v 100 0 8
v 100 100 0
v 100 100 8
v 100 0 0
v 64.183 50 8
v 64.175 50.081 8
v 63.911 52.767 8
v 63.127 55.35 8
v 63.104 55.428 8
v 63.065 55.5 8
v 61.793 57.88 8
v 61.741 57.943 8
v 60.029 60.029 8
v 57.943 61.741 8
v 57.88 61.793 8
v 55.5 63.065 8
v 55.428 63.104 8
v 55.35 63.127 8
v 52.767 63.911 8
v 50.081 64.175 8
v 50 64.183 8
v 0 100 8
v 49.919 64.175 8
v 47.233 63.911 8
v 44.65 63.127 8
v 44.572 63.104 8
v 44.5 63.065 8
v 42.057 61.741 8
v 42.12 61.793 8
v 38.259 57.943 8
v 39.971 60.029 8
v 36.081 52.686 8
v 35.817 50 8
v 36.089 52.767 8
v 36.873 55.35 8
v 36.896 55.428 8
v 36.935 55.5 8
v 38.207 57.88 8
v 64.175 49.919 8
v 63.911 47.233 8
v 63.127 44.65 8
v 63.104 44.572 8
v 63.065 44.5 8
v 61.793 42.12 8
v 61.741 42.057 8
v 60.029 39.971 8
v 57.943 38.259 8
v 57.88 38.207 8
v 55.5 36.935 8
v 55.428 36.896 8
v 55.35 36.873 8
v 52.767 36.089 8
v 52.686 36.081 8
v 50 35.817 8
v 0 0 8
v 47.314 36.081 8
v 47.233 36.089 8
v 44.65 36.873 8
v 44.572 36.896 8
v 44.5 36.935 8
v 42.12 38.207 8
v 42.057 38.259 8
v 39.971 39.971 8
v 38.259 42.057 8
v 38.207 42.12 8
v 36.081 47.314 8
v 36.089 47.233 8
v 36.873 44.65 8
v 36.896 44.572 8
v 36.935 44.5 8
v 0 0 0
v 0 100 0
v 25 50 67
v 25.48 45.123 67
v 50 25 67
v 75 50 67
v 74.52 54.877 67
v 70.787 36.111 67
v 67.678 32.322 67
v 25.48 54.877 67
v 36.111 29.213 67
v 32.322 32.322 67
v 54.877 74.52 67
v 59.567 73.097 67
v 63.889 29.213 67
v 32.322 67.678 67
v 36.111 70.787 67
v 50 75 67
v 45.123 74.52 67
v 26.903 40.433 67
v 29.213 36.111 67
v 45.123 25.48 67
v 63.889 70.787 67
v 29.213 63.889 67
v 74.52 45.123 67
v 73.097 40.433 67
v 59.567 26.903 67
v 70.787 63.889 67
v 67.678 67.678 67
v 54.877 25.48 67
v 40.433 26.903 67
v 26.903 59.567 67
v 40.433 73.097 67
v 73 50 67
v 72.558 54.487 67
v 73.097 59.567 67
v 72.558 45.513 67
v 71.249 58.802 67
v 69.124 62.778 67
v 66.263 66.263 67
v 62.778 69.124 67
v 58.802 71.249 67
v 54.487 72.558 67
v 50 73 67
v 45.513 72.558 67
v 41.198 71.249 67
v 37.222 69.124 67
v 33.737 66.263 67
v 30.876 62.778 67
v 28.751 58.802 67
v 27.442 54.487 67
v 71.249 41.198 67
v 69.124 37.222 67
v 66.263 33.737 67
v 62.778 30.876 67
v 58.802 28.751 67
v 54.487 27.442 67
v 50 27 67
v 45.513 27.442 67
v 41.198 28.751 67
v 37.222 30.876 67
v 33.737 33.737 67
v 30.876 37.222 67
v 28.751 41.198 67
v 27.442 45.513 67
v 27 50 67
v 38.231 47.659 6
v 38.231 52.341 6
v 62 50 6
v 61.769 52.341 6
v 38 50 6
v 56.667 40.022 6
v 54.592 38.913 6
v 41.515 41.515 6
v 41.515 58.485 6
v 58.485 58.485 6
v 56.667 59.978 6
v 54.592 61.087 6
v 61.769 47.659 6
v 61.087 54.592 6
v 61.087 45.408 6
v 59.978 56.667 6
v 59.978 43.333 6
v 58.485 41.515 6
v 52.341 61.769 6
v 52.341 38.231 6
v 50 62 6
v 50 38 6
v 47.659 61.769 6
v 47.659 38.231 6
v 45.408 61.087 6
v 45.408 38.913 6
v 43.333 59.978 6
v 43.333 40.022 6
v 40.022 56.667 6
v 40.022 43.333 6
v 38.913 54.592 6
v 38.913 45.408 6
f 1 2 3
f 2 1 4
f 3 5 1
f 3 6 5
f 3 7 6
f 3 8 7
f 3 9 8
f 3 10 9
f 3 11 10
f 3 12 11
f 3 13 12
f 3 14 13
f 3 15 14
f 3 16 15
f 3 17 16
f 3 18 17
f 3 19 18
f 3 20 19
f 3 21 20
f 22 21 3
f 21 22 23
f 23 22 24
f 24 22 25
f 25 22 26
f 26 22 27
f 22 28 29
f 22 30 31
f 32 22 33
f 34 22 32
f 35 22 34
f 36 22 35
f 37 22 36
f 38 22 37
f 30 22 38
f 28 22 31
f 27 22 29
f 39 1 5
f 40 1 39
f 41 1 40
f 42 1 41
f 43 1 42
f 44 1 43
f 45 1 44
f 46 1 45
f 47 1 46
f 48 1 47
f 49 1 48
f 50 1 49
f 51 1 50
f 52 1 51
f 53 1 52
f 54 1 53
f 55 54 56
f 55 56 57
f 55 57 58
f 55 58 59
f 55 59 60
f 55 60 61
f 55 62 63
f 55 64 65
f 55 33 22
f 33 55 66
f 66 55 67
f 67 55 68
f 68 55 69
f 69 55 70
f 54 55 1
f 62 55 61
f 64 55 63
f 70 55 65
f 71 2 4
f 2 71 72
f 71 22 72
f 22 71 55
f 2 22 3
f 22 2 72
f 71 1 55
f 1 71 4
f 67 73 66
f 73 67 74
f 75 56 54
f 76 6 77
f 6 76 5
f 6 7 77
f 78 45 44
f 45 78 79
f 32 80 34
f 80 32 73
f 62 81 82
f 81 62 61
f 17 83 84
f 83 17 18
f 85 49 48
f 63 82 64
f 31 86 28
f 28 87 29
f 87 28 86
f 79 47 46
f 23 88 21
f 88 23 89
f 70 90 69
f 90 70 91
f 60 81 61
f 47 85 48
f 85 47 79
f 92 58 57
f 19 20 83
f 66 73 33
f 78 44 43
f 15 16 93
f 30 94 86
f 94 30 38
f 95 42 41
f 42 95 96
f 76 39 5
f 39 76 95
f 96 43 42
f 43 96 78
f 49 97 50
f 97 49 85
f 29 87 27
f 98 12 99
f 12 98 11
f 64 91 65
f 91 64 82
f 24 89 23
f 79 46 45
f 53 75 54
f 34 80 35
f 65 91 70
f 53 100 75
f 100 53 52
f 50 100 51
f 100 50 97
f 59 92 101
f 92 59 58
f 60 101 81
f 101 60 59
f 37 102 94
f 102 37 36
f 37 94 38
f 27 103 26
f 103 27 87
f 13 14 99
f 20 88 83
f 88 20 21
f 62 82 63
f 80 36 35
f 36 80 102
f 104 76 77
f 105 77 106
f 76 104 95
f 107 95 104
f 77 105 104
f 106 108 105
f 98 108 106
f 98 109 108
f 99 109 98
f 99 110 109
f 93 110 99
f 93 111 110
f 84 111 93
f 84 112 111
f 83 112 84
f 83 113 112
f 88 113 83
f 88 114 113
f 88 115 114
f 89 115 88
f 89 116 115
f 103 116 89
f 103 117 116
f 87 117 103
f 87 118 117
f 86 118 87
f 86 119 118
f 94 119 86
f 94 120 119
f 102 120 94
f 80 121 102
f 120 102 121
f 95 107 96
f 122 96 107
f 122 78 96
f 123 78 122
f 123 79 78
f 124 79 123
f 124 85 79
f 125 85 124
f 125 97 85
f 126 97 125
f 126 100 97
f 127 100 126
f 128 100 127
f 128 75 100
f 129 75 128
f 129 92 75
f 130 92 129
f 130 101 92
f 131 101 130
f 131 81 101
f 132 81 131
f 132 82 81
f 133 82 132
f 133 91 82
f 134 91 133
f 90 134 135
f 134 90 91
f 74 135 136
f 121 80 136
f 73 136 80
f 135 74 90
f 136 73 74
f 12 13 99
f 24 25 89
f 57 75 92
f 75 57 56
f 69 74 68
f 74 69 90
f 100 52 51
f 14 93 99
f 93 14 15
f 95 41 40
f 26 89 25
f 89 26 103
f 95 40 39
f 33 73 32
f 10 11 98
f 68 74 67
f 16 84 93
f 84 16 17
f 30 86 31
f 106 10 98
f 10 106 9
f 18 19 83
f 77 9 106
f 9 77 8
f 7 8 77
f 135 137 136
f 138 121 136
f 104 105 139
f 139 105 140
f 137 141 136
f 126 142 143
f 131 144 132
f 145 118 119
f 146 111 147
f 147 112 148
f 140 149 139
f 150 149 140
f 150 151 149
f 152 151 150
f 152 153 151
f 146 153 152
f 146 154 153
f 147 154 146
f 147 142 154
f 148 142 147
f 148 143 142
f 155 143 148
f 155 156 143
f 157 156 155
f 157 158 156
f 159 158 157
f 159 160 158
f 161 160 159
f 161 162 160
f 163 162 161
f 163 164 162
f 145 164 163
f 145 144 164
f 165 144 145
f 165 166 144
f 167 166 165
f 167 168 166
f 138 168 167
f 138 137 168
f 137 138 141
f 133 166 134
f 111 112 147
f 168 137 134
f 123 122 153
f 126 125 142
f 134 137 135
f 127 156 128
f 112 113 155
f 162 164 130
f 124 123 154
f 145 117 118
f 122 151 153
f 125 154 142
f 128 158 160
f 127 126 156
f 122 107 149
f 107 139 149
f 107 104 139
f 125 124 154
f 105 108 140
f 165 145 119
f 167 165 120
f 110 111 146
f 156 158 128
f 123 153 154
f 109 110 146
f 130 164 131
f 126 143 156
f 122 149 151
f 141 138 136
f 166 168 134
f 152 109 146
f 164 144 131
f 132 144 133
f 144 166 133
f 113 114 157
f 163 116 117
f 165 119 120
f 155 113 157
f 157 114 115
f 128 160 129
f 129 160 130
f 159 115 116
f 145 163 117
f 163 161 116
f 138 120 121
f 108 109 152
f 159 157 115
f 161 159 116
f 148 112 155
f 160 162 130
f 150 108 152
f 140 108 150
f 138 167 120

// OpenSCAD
$fn = 32;

// ----------------------------------------------------------------------
// Hopper: funnel with square flange
// ----------------------------------------------------------------------

// --- parameters (mm) ---
fl = 100;                 // flange side, X and Y
fl_t = 8;                 // flange thickness
cone_h = 60;              // cone height above the flange
top_d = 50;               // cone mouth diameter
bot_d = 28;               // cone spout diameter
wall = 2;                 // cone wall thickness

bore_d = bot_d - 2 * wall;  // spout bore diameter
total_h = fl_t + cone_h - 1;  // overall height

difference() {
  union() {
    cube([fl, fl, fl_t]);
    translate([fl / 2, fl / 2, fl_t - 1])
      cylinder(h = cone_h, d1 = bot_d, d2 = top_d);
  }
  translate([fl / 2, fl / 2, fl_t - 2])
    cylinder(h = cone_h + 1, d1 = bore_d, d2 = top_d - 2 * wall);
}
